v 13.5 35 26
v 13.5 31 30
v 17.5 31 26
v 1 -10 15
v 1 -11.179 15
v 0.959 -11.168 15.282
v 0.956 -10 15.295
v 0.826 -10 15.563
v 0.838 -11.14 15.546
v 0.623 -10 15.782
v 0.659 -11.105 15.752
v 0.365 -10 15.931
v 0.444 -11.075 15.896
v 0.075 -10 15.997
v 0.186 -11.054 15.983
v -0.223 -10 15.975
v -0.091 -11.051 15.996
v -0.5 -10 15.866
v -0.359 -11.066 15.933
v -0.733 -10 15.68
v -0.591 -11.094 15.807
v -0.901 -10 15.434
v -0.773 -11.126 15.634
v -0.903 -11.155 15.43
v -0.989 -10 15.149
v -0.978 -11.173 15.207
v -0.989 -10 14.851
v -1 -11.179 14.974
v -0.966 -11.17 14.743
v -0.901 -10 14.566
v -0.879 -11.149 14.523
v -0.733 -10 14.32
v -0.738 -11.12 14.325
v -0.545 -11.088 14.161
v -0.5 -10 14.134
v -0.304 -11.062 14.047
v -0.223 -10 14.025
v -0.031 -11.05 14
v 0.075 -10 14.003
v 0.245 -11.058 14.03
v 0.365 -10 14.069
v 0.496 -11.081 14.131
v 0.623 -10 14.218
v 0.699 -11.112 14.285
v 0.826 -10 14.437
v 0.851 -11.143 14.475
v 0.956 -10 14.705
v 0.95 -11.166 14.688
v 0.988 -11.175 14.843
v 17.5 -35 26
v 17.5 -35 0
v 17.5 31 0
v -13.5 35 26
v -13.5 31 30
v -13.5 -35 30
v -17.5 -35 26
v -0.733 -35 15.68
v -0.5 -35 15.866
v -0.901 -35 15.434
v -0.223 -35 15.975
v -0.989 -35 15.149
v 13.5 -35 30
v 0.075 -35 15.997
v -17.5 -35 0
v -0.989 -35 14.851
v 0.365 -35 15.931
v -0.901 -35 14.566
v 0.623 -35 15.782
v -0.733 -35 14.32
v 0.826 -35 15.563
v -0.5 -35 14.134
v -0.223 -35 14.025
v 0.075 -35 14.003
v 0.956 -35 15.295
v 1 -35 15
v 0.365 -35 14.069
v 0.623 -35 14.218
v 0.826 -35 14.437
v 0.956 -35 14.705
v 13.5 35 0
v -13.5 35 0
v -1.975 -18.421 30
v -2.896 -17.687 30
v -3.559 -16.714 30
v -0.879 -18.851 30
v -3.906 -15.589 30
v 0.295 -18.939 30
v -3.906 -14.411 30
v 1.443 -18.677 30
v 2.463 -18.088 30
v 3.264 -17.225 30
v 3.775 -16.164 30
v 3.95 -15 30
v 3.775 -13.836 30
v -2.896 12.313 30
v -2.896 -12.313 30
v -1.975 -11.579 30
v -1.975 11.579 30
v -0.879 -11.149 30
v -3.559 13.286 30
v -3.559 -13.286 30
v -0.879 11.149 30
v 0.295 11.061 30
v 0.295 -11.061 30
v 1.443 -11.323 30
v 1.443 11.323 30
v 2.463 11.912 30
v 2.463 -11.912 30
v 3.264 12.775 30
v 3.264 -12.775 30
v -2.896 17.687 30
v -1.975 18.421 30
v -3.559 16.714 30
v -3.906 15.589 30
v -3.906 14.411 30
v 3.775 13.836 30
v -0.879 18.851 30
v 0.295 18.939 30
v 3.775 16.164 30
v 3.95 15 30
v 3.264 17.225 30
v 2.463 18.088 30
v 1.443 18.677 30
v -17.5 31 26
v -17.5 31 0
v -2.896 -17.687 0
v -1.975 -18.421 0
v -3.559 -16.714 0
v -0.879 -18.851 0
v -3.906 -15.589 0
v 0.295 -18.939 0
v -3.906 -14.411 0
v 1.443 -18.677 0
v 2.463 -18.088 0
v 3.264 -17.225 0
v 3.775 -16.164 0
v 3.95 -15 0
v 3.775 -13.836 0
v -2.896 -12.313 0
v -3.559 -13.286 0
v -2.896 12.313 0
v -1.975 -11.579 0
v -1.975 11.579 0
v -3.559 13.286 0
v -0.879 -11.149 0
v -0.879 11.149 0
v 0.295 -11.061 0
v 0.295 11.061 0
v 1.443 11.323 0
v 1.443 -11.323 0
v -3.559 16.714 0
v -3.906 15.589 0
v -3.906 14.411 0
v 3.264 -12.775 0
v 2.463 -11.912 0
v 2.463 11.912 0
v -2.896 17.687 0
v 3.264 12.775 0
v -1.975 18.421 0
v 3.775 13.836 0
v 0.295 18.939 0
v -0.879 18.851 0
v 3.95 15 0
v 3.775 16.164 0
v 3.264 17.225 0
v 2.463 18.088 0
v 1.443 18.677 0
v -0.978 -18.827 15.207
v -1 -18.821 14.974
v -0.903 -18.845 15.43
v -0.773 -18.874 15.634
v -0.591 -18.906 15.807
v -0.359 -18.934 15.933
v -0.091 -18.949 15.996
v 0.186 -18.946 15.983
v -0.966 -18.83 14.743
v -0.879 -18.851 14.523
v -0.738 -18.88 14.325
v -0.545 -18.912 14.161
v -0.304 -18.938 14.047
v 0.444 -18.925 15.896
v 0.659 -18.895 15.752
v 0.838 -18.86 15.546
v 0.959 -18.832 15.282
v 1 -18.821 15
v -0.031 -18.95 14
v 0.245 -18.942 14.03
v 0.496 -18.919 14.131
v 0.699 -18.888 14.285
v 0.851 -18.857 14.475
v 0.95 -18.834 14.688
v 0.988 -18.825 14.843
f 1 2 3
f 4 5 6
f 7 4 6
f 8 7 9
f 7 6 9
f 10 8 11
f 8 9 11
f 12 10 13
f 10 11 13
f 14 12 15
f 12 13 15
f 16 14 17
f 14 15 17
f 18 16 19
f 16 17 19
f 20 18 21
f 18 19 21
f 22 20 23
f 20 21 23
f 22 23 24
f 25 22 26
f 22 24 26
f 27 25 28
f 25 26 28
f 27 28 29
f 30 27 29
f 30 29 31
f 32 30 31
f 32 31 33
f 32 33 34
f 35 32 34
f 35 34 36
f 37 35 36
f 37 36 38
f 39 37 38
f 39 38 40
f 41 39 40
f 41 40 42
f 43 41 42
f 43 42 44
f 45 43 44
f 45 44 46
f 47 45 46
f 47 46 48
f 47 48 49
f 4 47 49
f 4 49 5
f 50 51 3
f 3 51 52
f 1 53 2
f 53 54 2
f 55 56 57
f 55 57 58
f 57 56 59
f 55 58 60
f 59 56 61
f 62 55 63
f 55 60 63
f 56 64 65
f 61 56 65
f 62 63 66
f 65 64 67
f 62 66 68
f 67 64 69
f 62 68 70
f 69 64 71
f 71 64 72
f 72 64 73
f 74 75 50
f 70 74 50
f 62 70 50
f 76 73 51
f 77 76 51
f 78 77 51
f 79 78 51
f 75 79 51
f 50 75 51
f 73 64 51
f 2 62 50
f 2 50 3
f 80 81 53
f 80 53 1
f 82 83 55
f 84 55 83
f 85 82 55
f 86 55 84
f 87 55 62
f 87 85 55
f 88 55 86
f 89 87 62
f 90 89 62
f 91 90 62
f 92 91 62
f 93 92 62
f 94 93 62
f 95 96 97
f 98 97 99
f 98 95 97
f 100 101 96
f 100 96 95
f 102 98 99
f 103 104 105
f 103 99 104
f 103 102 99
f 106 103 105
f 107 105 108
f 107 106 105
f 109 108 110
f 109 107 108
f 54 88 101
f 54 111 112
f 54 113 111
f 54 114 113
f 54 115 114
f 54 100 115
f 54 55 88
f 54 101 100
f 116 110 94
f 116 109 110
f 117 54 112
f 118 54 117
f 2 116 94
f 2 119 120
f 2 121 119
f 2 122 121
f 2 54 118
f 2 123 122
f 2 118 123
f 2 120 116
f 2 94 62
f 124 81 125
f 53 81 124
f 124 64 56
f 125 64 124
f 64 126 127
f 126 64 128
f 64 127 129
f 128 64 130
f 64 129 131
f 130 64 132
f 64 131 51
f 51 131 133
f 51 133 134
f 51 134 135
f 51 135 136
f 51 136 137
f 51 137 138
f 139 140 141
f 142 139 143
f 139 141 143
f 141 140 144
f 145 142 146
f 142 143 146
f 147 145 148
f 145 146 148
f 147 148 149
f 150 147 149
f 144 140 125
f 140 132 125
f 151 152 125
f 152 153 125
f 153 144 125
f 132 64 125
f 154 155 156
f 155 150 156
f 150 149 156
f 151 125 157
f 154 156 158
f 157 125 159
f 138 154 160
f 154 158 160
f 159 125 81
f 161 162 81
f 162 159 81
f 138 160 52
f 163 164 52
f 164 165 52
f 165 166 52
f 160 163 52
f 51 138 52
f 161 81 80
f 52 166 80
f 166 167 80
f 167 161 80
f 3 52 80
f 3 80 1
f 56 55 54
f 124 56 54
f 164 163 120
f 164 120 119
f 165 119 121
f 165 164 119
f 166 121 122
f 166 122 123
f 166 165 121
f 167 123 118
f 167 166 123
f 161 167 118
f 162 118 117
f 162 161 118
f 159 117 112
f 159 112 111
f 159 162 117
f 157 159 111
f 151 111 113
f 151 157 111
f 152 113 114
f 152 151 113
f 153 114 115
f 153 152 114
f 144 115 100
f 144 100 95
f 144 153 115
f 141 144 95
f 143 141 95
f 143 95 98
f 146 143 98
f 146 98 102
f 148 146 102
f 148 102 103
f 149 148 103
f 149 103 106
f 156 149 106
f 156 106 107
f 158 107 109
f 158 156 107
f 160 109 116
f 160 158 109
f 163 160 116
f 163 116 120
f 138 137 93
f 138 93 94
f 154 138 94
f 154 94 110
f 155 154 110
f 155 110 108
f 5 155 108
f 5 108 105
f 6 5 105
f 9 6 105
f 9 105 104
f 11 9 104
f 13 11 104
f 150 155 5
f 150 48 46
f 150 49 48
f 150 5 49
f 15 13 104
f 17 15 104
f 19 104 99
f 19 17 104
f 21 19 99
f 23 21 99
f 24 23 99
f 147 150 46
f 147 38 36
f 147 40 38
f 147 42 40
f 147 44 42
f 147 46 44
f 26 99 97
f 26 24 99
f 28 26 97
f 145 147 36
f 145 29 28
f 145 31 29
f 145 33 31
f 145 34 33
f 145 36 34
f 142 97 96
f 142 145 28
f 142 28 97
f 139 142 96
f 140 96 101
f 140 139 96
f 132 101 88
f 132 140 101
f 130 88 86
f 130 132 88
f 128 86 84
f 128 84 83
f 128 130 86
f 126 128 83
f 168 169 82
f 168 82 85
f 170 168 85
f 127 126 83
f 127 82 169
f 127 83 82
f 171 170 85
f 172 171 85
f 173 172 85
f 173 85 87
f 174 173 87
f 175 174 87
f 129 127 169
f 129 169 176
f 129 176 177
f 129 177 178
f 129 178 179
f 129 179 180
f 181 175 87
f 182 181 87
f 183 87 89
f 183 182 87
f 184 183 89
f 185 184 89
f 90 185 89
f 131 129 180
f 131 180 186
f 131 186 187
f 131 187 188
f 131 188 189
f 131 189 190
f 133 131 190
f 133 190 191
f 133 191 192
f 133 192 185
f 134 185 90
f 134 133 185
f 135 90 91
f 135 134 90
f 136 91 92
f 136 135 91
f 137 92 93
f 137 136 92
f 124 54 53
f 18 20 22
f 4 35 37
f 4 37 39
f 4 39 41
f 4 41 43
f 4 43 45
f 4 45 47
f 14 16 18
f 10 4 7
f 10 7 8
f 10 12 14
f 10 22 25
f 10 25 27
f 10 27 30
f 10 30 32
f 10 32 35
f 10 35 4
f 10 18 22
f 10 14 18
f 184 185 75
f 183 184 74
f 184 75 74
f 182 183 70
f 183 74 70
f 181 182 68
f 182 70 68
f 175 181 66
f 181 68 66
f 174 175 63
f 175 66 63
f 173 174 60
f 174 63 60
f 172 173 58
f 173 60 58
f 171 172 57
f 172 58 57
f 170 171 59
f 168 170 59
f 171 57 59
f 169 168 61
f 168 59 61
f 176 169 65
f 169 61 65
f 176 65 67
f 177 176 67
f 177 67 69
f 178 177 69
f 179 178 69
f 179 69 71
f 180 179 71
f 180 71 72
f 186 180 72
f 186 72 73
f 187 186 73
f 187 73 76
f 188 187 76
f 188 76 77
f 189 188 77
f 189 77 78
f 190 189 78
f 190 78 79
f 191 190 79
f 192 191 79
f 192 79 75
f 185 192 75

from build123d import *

# Parameters (mm, degrees)
F0_W     = 35
F0_H     = 70
F0_R     = 3.95
F1_DEPTH = 30
F2_SIZE  = 4
F3_R     = 1
F4_DEPTH = 25


with BuildPart() as f1:
    # F0 (on Top) → F1 (new body)
    with BuildSketch(Plane.XY):
        Rectangle(F0_W, F0_H)
        with Locations((0, -15)):
            Circle(F0_R, mode=Mode.SUBTRACT)
        with Locations((0, 15)):
            Circle(F0_R, mode=Mode.SUBTRACT)
    extrude(amount=F1_DEPTH)

    # F2
    f2_edges = [f1.edges().sort_by_distance(p)[0] for p in [
        (0, 35, 30),
        (17.5, 0, 30),
        (-17.5, 0, 30),
        (17.5, 35, 15),
        (-17.5, 35, 15),
    ]]
    chamfer(f2_edges, length=F2_SIZE)

    # F3 (on face) → F4 (cut)
    with BuildSketch(Plane.XZ.offset(35)):
        with Locations((0, 15)):
            Circle(F3_R)
    extrude(amount=-F4_DEPTH, mode=Mode.SUBTRACT)


solid = f1.part
